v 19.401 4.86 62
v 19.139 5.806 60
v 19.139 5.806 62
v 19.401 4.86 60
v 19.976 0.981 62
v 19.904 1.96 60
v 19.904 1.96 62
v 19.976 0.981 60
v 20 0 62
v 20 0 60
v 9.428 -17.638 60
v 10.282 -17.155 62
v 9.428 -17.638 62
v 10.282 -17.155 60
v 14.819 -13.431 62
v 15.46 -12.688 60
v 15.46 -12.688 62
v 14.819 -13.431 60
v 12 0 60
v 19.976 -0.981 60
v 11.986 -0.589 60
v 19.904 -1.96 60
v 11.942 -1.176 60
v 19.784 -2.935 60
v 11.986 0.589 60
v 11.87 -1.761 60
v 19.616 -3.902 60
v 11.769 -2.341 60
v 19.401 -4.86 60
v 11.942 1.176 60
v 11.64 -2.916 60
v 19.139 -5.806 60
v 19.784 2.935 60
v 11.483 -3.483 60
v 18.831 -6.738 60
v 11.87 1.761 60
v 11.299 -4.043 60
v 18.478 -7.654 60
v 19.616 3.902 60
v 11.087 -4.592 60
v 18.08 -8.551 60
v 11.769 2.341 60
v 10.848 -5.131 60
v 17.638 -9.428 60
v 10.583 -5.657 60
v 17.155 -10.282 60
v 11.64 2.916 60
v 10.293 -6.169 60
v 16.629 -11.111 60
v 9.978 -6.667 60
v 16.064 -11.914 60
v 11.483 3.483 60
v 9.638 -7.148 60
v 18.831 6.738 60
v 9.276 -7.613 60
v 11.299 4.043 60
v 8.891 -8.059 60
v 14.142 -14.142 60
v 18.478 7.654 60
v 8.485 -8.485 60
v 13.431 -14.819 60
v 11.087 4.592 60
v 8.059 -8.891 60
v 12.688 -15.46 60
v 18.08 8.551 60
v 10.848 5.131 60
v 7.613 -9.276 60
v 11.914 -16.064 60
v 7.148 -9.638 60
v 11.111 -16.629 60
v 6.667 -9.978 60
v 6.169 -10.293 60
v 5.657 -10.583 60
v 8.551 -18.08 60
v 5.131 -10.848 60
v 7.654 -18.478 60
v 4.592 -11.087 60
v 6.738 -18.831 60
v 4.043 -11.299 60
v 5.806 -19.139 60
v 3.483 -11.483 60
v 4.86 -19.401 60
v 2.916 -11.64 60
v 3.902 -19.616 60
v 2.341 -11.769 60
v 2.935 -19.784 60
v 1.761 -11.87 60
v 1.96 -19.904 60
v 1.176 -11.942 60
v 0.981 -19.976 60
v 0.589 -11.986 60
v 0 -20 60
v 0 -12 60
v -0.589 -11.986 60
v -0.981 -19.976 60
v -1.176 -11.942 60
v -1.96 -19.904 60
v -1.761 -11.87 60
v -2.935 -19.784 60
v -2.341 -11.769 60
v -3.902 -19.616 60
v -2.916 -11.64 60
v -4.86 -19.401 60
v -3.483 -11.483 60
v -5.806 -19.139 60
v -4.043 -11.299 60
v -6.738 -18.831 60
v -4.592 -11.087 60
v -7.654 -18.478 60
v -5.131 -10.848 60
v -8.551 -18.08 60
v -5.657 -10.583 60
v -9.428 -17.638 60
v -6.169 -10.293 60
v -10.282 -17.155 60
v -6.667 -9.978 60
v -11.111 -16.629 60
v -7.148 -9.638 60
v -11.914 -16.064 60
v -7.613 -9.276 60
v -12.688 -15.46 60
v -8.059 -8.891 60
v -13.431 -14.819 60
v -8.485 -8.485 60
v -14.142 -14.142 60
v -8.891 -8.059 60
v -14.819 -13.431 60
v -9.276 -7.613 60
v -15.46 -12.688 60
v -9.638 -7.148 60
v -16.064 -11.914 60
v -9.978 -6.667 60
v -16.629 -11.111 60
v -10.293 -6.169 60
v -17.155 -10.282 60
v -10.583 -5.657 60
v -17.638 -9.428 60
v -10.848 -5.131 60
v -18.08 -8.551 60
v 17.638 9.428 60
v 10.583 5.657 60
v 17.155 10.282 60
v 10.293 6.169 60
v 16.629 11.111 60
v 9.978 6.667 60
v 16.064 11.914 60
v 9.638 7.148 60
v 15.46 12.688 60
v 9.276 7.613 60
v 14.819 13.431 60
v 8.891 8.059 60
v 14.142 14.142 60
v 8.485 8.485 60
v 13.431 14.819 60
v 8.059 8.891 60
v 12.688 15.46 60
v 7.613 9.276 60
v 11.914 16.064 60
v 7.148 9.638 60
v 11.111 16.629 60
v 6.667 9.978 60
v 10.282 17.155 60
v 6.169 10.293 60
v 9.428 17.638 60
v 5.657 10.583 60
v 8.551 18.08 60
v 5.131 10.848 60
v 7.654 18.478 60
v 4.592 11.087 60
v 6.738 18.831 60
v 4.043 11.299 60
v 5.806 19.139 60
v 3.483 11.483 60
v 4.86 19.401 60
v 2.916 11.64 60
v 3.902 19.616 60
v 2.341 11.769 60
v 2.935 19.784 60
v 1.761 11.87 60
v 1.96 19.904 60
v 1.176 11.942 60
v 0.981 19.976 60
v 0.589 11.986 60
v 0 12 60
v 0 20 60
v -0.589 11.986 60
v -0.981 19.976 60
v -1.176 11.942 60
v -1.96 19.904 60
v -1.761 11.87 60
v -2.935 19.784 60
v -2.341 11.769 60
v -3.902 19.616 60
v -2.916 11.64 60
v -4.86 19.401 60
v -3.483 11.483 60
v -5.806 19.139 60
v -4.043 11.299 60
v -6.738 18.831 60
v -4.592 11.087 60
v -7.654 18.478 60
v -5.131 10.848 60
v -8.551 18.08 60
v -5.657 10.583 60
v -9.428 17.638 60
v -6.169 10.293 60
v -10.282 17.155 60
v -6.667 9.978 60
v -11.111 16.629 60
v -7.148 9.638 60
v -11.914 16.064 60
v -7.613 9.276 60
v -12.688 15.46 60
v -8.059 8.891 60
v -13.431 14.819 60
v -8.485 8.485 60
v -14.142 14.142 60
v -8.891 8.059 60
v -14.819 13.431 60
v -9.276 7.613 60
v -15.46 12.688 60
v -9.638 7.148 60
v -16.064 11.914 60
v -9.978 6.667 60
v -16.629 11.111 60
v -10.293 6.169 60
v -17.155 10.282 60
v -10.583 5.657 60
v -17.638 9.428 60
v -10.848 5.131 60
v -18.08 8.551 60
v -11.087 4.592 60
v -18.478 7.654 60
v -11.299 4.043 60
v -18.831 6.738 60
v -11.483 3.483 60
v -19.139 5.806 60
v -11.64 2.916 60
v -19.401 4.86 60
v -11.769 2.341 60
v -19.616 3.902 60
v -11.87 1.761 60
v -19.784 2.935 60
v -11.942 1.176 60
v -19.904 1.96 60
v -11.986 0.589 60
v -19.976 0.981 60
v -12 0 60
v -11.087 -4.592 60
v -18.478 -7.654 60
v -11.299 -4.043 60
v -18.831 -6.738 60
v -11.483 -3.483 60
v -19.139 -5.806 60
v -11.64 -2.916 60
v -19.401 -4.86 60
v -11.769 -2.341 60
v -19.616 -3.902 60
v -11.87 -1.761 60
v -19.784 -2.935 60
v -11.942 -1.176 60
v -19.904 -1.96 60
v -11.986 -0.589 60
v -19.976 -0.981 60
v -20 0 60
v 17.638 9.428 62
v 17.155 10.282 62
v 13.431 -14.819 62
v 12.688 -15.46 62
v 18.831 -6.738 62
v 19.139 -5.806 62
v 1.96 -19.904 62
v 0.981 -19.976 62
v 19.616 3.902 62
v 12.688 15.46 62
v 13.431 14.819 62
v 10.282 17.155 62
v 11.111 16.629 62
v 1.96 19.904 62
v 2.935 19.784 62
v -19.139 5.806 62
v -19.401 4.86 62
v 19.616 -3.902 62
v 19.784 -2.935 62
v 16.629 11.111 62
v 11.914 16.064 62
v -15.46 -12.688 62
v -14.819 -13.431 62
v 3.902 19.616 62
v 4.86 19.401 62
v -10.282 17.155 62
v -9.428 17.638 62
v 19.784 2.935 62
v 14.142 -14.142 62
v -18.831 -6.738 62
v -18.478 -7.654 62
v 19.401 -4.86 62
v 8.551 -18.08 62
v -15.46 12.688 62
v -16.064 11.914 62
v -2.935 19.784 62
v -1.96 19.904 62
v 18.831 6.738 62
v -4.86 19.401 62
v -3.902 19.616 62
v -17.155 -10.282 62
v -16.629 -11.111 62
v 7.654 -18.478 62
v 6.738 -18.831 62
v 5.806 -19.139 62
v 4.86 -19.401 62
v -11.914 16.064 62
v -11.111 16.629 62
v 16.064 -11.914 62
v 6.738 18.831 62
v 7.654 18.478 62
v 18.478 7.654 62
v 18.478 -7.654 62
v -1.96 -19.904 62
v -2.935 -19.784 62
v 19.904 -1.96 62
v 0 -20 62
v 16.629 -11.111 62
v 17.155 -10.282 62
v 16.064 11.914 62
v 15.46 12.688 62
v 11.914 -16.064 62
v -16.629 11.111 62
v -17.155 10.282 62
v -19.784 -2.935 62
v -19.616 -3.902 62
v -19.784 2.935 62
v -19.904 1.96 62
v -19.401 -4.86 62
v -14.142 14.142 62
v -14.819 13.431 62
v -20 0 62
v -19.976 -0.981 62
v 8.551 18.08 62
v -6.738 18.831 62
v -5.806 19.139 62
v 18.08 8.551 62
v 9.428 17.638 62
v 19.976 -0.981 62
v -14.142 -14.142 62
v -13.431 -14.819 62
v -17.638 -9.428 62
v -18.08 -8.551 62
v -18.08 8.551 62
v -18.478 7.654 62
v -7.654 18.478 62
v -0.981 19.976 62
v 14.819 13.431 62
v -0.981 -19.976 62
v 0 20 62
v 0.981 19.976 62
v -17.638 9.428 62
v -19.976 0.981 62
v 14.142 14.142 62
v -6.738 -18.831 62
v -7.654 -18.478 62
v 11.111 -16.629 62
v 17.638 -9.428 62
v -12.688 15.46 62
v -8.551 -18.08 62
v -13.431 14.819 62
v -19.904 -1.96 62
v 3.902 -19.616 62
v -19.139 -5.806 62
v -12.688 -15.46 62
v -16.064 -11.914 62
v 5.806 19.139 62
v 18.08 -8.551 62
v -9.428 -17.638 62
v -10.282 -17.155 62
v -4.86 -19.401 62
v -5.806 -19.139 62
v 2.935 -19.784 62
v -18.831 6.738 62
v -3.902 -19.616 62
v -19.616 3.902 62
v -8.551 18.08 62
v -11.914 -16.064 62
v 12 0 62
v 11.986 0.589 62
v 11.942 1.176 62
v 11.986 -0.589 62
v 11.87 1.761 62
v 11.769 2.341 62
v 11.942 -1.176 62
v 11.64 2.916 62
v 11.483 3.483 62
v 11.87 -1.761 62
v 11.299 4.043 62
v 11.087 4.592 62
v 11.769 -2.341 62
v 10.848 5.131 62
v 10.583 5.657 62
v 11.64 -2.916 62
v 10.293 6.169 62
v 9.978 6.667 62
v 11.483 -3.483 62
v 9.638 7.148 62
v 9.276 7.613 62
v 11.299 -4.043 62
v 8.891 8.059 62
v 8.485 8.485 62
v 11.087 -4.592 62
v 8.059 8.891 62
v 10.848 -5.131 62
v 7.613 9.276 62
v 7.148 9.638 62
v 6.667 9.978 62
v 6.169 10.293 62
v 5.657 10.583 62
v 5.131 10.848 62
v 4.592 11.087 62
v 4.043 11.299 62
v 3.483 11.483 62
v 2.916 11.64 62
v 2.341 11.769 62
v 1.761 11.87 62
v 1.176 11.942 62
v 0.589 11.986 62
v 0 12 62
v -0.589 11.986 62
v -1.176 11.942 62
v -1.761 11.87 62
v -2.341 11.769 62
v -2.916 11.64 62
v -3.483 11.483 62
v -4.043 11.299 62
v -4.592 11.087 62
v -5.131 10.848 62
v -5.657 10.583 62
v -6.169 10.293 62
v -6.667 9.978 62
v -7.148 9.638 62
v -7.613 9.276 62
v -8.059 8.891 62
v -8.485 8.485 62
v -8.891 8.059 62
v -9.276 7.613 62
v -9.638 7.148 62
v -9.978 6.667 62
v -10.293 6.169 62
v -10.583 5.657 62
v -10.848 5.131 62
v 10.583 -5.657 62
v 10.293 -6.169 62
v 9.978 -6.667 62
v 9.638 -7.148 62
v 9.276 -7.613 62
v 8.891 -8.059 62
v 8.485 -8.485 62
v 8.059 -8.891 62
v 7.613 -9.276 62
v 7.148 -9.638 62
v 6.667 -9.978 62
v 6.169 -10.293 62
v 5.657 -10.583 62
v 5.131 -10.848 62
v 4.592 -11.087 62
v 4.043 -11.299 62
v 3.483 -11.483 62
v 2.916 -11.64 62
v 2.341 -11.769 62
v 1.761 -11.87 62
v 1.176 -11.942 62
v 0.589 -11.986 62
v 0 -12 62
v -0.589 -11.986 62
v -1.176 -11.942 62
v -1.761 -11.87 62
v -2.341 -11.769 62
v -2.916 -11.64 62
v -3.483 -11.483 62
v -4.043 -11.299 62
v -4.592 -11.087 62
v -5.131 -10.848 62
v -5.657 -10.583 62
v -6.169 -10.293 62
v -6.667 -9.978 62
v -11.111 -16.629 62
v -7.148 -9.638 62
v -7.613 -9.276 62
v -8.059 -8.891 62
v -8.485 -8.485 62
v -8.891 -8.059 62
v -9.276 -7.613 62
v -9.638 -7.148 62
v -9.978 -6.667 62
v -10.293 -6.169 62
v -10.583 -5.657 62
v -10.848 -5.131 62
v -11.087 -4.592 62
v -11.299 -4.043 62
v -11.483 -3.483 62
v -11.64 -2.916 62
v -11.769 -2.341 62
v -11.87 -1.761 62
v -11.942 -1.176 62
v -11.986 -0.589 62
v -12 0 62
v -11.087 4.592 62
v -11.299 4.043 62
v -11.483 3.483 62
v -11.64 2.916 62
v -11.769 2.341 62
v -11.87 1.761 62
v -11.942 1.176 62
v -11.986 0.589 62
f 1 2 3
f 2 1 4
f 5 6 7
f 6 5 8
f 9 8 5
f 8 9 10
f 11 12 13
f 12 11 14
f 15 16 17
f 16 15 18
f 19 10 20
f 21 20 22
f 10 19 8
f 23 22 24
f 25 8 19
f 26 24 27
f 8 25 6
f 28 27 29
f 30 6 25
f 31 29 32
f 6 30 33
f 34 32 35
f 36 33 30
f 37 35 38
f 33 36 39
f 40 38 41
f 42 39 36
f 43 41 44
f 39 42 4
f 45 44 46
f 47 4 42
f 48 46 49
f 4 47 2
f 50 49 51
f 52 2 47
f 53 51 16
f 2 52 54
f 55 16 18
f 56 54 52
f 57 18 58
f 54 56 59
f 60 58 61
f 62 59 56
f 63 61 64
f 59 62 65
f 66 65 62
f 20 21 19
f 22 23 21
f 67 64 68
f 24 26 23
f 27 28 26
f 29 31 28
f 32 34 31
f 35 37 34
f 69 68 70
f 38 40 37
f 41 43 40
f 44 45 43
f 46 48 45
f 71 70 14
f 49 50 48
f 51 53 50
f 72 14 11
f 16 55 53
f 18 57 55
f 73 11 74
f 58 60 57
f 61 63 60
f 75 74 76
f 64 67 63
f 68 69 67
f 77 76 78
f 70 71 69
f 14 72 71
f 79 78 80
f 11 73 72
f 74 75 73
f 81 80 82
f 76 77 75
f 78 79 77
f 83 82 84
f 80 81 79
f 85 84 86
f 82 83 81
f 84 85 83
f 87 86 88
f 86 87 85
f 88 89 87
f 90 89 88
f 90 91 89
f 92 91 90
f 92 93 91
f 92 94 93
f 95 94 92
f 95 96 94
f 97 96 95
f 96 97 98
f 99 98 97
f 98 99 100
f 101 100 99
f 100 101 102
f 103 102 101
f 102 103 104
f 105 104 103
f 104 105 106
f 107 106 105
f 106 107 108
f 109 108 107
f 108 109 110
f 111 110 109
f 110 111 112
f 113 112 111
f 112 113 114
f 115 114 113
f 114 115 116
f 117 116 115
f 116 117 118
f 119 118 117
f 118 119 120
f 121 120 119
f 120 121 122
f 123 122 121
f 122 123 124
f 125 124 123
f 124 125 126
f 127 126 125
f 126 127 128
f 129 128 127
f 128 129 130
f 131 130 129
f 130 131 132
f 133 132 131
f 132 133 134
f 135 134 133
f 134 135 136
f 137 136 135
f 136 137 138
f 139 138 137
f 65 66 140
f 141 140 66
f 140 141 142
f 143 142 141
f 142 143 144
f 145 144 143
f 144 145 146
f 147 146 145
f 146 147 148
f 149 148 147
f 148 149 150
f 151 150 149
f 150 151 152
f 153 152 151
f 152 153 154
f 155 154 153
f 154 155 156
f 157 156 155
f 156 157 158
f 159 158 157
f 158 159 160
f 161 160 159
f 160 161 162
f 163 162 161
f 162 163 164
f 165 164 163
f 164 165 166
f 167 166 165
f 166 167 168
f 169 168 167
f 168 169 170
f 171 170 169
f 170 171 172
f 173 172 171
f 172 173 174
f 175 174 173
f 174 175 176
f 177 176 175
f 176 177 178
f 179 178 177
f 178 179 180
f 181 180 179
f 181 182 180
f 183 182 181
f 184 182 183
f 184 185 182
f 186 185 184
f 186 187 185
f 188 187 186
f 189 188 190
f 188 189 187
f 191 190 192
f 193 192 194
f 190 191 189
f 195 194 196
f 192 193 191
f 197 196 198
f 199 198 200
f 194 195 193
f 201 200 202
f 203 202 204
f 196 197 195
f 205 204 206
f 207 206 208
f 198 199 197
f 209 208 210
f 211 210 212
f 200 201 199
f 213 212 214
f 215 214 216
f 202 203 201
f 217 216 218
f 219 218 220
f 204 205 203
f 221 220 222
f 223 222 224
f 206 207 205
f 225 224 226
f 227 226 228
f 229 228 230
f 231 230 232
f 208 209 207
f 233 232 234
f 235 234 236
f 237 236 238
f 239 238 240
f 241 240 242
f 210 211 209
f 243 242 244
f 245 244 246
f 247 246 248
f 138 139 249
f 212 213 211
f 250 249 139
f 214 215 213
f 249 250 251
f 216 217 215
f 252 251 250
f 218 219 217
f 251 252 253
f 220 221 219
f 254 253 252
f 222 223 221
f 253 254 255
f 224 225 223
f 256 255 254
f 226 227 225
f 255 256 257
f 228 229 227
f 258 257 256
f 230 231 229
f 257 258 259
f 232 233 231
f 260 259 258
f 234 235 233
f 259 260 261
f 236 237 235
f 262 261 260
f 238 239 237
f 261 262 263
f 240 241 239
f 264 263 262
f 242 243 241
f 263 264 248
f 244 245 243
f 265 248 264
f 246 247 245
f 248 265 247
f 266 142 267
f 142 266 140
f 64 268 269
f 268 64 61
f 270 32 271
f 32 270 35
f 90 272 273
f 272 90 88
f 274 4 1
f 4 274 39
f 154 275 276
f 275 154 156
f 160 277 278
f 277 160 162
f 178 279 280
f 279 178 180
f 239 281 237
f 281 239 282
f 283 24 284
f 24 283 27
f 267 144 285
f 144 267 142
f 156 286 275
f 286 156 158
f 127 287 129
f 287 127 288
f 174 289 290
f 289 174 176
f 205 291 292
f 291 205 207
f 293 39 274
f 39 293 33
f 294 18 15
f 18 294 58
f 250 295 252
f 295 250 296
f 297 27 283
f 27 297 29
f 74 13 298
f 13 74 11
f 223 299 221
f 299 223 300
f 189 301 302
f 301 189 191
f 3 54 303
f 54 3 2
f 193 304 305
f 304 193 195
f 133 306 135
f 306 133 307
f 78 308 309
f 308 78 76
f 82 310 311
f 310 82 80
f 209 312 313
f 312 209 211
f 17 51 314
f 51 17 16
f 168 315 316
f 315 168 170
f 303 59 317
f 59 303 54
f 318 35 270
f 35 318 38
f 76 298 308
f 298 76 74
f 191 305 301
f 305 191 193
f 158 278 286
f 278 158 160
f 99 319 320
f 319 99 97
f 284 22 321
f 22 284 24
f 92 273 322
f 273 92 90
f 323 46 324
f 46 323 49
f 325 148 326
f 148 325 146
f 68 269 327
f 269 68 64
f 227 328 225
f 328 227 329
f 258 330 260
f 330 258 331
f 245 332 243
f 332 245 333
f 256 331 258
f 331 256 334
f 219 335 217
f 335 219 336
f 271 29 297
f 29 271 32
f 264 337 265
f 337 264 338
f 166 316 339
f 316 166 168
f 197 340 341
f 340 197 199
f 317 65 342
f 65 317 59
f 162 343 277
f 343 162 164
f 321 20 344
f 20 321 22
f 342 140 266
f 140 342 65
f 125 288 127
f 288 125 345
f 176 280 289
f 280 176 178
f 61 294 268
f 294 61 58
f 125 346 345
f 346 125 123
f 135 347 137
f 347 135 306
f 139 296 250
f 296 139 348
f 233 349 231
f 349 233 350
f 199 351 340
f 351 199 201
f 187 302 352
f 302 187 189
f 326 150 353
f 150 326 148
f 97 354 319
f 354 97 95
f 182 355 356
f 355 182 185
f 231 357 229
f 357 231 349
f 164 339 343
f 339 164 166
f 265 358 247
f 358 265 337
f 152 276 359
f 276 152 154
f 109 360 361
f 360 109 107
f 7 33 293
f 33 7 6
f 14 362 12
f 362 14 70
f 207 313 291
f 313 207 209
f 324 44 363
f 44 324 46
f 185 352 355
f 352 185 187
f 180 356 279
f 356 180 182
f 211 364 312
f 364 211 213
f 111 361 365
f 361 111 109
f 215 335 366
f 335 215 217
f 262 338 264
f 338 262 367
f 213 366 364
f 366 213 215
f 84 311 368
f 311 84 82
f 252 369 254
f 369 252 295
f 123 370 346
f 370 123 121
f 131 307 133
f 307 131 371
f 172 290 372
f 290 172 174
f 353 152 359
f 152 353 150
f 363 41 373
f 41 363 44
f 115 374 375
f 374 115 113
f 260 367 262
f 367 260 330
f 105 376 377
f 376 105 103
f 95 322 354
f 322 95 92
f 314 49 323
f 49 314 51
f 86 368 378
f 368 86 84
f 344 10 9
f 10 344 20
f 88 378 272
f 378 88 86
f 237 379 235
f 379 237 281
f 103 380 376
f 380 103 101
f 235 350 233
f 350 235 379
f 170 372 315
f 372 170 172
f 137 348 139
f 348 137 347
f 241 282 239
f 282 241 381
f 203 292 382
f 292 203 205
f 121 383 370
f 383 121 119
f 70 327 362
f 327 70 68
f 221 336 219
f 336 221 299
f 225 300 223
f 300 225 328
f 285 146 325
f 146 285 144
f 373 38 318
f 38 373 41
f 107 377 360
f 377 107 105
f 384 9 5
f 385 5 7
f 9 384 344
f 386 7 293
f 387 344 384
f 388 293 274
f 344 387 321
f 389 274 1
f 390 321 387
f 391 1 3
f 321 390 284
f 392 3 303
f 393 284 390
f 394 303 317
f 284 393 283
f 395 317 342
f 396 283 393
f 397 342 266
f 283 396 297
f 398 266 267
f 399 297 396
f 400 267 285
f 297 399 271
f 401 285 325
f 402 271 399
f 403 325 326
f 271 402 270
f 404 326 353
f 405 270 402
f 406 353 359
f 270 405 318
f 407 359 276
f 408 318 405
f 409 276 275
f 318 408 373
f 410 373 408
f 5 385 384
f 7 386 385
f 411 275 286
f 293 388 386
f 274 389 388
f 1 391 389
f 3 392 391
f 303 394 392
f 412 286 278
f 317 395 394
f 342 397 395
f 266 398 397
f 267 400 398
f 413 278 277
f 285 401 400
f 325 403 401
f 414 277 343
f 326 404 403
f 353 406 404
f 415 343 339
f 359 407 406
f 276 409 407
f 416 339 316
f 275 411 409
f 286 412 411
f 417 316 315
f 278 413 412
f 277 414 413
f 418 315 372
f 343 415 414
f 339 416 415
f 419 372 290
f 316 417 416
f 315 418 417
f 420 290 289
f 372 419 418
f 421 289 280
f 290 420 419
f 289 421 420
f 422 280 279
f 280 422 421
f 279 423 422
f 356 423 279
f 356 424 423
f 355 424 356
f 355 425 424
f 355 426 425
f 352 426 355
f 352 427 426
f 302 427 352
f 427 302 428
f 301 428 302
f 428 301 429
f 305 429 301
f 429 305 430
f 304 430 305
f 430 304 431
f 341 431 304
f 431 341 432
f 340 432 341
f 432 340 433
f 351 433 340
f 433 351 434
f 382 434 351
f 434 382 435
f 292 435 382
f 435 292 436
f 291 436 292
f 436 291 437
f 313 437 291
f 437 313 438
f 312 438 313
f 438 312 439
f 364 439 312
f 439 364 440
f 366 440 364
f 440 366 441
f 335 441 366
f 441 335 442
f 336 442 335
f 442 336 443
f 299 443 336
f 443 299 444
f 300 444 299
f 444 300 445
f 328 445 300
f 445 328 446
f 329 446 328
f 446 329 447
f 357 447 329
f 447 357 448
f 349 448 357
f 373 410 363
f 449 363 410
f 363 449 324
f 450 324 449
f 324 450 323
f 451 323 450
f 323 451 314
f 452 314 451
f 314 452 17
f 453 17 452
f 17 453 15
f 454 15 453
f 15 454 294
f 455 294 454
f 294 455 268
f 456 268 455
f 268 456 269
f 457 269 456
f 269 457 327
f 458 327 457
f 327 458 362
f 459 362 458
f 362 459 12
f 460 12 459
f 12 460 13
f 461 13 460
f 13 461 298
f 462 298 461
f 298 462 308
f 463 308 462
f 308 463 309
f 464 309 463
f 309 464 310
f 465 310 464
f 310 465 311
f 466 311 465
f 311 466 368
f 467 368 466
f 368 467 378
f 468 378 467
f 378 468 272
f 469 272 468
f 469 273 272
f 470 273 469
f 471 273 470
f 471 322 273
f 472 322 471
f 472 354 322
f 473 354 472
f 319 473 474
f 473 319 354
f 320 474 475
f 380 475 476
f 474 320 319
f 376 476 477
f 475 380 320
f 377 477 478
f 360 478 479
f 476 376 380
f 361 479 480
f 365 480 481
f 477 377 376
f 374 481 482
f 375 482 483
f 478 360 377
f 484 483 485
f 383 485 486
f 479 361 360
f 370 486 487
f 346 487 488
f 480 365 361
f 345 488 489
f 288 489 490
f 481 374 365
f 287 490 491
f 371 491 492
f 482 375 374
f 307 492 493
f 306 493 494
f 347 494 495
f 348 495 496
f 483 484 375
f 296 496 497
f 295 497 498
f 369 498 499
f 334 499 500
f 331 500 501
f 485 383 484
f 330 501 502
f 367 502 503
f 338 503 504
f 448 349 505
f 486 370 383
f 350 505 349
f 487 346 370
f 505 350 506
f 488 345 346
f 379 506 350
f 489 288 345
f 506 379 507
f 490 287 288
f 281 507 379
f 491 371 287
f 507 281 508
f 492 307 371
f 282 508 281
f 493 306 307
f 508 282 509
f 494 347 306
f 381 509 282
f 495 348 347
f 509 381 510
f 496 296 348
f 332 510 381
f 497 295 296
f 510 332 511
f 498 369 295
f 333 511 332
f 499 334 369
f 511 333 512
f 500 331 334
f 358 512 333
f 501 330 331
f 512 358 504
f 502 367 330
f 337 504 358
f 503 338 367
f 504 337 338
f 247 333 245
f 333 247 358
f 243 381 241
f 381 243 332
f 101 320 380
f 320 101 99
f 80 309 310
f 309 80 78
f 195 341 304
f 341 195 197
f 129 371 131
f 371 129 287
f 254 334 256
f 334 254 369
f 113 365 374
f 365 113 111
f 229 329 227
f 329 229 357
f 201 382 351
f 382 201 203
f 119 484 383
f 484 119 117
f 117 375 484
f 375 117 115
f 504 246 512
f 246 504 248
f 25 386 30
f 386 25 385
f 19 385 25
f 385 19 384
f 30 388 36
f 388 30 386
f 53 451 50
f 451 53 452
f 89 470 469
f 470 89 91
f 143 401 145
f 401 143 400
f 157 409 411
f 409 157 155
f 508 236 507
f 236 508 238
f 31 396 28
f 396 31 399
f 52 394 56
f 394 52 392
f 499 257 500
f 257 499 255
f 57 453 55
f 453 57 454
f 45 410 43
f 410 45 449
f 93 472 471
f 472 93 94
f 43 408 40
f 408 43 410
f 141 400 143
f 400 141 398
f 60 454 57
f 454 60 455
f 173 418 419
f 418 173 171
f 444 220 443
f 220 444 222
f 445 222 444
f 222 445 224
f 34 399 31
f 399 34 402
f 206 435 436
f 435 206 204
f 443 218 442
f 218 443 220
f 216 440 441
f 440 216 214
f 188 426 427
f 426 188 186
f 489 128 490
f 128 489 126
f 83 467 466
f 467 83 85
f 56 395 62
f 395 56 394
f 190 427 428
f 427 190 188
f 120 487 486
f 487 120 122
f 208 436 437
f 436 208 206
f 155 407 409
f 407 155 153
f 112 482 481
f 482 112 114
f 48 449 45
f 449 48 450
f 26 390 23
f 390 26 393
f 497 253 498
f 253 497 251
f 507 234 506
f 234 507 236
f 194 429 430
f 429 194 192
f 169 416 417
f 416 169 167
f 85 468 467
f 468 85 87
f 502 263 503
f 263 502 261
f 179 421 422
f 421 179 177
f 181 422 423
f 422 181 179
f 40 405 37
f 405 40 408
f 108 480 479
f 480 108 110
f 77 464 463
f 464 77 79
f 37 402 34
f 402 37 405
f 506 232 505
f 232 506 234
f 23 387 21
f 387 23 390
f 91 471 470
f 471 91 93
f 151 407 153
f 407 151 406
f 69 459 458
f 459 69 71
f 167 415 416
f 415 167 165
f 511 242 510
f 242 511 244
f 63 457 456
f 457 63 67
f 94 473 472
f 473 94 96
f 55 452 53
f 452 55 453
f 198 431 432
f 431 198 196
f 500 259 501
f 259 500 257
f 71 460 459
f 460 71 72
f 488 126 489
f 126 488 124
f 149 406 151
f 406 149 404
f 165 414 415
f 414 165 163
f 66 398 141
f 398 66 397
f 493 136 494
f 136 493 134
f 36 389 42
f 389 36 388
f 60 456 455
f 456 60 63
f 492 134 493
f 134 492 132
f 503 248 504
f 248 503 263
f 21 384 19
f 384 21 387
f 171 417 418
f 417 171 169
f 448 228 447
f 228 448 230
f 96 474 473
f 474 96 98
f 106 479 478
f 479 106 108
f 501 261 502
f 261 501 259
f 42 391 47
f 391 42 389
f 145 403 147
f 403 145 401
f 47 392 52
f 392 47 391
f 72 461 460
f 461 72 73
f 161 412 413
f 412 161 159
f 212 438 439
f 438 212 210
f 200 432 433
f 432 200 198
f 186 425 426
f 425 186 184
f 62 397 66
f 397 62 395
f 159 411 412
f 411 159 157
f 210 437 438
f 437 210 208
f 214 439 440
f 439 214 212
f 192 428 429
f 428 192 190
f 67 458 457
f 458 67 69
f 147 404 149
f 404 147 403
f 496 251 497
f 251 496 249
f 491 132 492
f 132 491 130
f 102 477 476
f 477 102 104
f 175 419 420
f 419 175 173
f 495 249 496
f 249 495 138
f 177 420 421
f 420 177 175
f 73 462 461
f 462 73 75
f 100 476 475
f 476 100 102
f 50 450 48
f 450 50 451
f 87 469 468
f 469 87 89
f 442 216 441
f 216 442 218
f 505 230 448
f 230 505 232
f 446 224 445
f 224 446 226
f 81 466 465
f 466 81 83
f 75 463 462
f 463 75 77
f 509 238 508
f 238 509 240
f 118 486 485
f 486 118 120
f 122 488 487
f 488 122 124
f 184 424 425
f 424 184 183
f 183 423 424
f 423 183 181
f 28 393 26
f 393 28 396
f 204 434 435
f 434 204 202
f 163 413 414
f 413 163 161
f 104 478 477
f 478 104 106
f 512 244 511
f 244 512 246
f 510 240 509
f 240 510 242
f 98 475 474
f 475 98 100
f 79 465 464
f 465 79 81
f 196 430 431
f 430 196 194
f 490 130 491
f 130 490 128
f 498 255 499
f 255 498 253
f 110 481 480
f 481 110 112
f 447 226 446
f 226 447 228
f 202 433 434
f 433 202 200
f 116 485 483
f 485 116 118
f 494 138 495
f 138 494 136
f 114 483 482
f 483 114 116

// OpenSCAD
// file: common_params.scad
cylinder_radius = 20.000000;
cylinder_height = 60.000000;
wall_thickness = 2.000000;

cap_thickness = 2.000000;

rod_radius = 2.000000;
rod_height = 50.000000;

ring_outer_radius = 8.000000;
ring_inner_radius = 4.000000;
ring_thickness = 3.000000;
ring_z = 40.000000;

$fn = 128;
// main file
include <common_params.scad>;

hole_radius = 12.000000;

translate([0, 0, cylinder_height])
difference() {
    cylinder(h = cap_thickness, r = cylinder_radius);
    translate([0, 0, -0.1])
        cylinder(h = cap_thickness + 0.2, r = hole_radius);
}
